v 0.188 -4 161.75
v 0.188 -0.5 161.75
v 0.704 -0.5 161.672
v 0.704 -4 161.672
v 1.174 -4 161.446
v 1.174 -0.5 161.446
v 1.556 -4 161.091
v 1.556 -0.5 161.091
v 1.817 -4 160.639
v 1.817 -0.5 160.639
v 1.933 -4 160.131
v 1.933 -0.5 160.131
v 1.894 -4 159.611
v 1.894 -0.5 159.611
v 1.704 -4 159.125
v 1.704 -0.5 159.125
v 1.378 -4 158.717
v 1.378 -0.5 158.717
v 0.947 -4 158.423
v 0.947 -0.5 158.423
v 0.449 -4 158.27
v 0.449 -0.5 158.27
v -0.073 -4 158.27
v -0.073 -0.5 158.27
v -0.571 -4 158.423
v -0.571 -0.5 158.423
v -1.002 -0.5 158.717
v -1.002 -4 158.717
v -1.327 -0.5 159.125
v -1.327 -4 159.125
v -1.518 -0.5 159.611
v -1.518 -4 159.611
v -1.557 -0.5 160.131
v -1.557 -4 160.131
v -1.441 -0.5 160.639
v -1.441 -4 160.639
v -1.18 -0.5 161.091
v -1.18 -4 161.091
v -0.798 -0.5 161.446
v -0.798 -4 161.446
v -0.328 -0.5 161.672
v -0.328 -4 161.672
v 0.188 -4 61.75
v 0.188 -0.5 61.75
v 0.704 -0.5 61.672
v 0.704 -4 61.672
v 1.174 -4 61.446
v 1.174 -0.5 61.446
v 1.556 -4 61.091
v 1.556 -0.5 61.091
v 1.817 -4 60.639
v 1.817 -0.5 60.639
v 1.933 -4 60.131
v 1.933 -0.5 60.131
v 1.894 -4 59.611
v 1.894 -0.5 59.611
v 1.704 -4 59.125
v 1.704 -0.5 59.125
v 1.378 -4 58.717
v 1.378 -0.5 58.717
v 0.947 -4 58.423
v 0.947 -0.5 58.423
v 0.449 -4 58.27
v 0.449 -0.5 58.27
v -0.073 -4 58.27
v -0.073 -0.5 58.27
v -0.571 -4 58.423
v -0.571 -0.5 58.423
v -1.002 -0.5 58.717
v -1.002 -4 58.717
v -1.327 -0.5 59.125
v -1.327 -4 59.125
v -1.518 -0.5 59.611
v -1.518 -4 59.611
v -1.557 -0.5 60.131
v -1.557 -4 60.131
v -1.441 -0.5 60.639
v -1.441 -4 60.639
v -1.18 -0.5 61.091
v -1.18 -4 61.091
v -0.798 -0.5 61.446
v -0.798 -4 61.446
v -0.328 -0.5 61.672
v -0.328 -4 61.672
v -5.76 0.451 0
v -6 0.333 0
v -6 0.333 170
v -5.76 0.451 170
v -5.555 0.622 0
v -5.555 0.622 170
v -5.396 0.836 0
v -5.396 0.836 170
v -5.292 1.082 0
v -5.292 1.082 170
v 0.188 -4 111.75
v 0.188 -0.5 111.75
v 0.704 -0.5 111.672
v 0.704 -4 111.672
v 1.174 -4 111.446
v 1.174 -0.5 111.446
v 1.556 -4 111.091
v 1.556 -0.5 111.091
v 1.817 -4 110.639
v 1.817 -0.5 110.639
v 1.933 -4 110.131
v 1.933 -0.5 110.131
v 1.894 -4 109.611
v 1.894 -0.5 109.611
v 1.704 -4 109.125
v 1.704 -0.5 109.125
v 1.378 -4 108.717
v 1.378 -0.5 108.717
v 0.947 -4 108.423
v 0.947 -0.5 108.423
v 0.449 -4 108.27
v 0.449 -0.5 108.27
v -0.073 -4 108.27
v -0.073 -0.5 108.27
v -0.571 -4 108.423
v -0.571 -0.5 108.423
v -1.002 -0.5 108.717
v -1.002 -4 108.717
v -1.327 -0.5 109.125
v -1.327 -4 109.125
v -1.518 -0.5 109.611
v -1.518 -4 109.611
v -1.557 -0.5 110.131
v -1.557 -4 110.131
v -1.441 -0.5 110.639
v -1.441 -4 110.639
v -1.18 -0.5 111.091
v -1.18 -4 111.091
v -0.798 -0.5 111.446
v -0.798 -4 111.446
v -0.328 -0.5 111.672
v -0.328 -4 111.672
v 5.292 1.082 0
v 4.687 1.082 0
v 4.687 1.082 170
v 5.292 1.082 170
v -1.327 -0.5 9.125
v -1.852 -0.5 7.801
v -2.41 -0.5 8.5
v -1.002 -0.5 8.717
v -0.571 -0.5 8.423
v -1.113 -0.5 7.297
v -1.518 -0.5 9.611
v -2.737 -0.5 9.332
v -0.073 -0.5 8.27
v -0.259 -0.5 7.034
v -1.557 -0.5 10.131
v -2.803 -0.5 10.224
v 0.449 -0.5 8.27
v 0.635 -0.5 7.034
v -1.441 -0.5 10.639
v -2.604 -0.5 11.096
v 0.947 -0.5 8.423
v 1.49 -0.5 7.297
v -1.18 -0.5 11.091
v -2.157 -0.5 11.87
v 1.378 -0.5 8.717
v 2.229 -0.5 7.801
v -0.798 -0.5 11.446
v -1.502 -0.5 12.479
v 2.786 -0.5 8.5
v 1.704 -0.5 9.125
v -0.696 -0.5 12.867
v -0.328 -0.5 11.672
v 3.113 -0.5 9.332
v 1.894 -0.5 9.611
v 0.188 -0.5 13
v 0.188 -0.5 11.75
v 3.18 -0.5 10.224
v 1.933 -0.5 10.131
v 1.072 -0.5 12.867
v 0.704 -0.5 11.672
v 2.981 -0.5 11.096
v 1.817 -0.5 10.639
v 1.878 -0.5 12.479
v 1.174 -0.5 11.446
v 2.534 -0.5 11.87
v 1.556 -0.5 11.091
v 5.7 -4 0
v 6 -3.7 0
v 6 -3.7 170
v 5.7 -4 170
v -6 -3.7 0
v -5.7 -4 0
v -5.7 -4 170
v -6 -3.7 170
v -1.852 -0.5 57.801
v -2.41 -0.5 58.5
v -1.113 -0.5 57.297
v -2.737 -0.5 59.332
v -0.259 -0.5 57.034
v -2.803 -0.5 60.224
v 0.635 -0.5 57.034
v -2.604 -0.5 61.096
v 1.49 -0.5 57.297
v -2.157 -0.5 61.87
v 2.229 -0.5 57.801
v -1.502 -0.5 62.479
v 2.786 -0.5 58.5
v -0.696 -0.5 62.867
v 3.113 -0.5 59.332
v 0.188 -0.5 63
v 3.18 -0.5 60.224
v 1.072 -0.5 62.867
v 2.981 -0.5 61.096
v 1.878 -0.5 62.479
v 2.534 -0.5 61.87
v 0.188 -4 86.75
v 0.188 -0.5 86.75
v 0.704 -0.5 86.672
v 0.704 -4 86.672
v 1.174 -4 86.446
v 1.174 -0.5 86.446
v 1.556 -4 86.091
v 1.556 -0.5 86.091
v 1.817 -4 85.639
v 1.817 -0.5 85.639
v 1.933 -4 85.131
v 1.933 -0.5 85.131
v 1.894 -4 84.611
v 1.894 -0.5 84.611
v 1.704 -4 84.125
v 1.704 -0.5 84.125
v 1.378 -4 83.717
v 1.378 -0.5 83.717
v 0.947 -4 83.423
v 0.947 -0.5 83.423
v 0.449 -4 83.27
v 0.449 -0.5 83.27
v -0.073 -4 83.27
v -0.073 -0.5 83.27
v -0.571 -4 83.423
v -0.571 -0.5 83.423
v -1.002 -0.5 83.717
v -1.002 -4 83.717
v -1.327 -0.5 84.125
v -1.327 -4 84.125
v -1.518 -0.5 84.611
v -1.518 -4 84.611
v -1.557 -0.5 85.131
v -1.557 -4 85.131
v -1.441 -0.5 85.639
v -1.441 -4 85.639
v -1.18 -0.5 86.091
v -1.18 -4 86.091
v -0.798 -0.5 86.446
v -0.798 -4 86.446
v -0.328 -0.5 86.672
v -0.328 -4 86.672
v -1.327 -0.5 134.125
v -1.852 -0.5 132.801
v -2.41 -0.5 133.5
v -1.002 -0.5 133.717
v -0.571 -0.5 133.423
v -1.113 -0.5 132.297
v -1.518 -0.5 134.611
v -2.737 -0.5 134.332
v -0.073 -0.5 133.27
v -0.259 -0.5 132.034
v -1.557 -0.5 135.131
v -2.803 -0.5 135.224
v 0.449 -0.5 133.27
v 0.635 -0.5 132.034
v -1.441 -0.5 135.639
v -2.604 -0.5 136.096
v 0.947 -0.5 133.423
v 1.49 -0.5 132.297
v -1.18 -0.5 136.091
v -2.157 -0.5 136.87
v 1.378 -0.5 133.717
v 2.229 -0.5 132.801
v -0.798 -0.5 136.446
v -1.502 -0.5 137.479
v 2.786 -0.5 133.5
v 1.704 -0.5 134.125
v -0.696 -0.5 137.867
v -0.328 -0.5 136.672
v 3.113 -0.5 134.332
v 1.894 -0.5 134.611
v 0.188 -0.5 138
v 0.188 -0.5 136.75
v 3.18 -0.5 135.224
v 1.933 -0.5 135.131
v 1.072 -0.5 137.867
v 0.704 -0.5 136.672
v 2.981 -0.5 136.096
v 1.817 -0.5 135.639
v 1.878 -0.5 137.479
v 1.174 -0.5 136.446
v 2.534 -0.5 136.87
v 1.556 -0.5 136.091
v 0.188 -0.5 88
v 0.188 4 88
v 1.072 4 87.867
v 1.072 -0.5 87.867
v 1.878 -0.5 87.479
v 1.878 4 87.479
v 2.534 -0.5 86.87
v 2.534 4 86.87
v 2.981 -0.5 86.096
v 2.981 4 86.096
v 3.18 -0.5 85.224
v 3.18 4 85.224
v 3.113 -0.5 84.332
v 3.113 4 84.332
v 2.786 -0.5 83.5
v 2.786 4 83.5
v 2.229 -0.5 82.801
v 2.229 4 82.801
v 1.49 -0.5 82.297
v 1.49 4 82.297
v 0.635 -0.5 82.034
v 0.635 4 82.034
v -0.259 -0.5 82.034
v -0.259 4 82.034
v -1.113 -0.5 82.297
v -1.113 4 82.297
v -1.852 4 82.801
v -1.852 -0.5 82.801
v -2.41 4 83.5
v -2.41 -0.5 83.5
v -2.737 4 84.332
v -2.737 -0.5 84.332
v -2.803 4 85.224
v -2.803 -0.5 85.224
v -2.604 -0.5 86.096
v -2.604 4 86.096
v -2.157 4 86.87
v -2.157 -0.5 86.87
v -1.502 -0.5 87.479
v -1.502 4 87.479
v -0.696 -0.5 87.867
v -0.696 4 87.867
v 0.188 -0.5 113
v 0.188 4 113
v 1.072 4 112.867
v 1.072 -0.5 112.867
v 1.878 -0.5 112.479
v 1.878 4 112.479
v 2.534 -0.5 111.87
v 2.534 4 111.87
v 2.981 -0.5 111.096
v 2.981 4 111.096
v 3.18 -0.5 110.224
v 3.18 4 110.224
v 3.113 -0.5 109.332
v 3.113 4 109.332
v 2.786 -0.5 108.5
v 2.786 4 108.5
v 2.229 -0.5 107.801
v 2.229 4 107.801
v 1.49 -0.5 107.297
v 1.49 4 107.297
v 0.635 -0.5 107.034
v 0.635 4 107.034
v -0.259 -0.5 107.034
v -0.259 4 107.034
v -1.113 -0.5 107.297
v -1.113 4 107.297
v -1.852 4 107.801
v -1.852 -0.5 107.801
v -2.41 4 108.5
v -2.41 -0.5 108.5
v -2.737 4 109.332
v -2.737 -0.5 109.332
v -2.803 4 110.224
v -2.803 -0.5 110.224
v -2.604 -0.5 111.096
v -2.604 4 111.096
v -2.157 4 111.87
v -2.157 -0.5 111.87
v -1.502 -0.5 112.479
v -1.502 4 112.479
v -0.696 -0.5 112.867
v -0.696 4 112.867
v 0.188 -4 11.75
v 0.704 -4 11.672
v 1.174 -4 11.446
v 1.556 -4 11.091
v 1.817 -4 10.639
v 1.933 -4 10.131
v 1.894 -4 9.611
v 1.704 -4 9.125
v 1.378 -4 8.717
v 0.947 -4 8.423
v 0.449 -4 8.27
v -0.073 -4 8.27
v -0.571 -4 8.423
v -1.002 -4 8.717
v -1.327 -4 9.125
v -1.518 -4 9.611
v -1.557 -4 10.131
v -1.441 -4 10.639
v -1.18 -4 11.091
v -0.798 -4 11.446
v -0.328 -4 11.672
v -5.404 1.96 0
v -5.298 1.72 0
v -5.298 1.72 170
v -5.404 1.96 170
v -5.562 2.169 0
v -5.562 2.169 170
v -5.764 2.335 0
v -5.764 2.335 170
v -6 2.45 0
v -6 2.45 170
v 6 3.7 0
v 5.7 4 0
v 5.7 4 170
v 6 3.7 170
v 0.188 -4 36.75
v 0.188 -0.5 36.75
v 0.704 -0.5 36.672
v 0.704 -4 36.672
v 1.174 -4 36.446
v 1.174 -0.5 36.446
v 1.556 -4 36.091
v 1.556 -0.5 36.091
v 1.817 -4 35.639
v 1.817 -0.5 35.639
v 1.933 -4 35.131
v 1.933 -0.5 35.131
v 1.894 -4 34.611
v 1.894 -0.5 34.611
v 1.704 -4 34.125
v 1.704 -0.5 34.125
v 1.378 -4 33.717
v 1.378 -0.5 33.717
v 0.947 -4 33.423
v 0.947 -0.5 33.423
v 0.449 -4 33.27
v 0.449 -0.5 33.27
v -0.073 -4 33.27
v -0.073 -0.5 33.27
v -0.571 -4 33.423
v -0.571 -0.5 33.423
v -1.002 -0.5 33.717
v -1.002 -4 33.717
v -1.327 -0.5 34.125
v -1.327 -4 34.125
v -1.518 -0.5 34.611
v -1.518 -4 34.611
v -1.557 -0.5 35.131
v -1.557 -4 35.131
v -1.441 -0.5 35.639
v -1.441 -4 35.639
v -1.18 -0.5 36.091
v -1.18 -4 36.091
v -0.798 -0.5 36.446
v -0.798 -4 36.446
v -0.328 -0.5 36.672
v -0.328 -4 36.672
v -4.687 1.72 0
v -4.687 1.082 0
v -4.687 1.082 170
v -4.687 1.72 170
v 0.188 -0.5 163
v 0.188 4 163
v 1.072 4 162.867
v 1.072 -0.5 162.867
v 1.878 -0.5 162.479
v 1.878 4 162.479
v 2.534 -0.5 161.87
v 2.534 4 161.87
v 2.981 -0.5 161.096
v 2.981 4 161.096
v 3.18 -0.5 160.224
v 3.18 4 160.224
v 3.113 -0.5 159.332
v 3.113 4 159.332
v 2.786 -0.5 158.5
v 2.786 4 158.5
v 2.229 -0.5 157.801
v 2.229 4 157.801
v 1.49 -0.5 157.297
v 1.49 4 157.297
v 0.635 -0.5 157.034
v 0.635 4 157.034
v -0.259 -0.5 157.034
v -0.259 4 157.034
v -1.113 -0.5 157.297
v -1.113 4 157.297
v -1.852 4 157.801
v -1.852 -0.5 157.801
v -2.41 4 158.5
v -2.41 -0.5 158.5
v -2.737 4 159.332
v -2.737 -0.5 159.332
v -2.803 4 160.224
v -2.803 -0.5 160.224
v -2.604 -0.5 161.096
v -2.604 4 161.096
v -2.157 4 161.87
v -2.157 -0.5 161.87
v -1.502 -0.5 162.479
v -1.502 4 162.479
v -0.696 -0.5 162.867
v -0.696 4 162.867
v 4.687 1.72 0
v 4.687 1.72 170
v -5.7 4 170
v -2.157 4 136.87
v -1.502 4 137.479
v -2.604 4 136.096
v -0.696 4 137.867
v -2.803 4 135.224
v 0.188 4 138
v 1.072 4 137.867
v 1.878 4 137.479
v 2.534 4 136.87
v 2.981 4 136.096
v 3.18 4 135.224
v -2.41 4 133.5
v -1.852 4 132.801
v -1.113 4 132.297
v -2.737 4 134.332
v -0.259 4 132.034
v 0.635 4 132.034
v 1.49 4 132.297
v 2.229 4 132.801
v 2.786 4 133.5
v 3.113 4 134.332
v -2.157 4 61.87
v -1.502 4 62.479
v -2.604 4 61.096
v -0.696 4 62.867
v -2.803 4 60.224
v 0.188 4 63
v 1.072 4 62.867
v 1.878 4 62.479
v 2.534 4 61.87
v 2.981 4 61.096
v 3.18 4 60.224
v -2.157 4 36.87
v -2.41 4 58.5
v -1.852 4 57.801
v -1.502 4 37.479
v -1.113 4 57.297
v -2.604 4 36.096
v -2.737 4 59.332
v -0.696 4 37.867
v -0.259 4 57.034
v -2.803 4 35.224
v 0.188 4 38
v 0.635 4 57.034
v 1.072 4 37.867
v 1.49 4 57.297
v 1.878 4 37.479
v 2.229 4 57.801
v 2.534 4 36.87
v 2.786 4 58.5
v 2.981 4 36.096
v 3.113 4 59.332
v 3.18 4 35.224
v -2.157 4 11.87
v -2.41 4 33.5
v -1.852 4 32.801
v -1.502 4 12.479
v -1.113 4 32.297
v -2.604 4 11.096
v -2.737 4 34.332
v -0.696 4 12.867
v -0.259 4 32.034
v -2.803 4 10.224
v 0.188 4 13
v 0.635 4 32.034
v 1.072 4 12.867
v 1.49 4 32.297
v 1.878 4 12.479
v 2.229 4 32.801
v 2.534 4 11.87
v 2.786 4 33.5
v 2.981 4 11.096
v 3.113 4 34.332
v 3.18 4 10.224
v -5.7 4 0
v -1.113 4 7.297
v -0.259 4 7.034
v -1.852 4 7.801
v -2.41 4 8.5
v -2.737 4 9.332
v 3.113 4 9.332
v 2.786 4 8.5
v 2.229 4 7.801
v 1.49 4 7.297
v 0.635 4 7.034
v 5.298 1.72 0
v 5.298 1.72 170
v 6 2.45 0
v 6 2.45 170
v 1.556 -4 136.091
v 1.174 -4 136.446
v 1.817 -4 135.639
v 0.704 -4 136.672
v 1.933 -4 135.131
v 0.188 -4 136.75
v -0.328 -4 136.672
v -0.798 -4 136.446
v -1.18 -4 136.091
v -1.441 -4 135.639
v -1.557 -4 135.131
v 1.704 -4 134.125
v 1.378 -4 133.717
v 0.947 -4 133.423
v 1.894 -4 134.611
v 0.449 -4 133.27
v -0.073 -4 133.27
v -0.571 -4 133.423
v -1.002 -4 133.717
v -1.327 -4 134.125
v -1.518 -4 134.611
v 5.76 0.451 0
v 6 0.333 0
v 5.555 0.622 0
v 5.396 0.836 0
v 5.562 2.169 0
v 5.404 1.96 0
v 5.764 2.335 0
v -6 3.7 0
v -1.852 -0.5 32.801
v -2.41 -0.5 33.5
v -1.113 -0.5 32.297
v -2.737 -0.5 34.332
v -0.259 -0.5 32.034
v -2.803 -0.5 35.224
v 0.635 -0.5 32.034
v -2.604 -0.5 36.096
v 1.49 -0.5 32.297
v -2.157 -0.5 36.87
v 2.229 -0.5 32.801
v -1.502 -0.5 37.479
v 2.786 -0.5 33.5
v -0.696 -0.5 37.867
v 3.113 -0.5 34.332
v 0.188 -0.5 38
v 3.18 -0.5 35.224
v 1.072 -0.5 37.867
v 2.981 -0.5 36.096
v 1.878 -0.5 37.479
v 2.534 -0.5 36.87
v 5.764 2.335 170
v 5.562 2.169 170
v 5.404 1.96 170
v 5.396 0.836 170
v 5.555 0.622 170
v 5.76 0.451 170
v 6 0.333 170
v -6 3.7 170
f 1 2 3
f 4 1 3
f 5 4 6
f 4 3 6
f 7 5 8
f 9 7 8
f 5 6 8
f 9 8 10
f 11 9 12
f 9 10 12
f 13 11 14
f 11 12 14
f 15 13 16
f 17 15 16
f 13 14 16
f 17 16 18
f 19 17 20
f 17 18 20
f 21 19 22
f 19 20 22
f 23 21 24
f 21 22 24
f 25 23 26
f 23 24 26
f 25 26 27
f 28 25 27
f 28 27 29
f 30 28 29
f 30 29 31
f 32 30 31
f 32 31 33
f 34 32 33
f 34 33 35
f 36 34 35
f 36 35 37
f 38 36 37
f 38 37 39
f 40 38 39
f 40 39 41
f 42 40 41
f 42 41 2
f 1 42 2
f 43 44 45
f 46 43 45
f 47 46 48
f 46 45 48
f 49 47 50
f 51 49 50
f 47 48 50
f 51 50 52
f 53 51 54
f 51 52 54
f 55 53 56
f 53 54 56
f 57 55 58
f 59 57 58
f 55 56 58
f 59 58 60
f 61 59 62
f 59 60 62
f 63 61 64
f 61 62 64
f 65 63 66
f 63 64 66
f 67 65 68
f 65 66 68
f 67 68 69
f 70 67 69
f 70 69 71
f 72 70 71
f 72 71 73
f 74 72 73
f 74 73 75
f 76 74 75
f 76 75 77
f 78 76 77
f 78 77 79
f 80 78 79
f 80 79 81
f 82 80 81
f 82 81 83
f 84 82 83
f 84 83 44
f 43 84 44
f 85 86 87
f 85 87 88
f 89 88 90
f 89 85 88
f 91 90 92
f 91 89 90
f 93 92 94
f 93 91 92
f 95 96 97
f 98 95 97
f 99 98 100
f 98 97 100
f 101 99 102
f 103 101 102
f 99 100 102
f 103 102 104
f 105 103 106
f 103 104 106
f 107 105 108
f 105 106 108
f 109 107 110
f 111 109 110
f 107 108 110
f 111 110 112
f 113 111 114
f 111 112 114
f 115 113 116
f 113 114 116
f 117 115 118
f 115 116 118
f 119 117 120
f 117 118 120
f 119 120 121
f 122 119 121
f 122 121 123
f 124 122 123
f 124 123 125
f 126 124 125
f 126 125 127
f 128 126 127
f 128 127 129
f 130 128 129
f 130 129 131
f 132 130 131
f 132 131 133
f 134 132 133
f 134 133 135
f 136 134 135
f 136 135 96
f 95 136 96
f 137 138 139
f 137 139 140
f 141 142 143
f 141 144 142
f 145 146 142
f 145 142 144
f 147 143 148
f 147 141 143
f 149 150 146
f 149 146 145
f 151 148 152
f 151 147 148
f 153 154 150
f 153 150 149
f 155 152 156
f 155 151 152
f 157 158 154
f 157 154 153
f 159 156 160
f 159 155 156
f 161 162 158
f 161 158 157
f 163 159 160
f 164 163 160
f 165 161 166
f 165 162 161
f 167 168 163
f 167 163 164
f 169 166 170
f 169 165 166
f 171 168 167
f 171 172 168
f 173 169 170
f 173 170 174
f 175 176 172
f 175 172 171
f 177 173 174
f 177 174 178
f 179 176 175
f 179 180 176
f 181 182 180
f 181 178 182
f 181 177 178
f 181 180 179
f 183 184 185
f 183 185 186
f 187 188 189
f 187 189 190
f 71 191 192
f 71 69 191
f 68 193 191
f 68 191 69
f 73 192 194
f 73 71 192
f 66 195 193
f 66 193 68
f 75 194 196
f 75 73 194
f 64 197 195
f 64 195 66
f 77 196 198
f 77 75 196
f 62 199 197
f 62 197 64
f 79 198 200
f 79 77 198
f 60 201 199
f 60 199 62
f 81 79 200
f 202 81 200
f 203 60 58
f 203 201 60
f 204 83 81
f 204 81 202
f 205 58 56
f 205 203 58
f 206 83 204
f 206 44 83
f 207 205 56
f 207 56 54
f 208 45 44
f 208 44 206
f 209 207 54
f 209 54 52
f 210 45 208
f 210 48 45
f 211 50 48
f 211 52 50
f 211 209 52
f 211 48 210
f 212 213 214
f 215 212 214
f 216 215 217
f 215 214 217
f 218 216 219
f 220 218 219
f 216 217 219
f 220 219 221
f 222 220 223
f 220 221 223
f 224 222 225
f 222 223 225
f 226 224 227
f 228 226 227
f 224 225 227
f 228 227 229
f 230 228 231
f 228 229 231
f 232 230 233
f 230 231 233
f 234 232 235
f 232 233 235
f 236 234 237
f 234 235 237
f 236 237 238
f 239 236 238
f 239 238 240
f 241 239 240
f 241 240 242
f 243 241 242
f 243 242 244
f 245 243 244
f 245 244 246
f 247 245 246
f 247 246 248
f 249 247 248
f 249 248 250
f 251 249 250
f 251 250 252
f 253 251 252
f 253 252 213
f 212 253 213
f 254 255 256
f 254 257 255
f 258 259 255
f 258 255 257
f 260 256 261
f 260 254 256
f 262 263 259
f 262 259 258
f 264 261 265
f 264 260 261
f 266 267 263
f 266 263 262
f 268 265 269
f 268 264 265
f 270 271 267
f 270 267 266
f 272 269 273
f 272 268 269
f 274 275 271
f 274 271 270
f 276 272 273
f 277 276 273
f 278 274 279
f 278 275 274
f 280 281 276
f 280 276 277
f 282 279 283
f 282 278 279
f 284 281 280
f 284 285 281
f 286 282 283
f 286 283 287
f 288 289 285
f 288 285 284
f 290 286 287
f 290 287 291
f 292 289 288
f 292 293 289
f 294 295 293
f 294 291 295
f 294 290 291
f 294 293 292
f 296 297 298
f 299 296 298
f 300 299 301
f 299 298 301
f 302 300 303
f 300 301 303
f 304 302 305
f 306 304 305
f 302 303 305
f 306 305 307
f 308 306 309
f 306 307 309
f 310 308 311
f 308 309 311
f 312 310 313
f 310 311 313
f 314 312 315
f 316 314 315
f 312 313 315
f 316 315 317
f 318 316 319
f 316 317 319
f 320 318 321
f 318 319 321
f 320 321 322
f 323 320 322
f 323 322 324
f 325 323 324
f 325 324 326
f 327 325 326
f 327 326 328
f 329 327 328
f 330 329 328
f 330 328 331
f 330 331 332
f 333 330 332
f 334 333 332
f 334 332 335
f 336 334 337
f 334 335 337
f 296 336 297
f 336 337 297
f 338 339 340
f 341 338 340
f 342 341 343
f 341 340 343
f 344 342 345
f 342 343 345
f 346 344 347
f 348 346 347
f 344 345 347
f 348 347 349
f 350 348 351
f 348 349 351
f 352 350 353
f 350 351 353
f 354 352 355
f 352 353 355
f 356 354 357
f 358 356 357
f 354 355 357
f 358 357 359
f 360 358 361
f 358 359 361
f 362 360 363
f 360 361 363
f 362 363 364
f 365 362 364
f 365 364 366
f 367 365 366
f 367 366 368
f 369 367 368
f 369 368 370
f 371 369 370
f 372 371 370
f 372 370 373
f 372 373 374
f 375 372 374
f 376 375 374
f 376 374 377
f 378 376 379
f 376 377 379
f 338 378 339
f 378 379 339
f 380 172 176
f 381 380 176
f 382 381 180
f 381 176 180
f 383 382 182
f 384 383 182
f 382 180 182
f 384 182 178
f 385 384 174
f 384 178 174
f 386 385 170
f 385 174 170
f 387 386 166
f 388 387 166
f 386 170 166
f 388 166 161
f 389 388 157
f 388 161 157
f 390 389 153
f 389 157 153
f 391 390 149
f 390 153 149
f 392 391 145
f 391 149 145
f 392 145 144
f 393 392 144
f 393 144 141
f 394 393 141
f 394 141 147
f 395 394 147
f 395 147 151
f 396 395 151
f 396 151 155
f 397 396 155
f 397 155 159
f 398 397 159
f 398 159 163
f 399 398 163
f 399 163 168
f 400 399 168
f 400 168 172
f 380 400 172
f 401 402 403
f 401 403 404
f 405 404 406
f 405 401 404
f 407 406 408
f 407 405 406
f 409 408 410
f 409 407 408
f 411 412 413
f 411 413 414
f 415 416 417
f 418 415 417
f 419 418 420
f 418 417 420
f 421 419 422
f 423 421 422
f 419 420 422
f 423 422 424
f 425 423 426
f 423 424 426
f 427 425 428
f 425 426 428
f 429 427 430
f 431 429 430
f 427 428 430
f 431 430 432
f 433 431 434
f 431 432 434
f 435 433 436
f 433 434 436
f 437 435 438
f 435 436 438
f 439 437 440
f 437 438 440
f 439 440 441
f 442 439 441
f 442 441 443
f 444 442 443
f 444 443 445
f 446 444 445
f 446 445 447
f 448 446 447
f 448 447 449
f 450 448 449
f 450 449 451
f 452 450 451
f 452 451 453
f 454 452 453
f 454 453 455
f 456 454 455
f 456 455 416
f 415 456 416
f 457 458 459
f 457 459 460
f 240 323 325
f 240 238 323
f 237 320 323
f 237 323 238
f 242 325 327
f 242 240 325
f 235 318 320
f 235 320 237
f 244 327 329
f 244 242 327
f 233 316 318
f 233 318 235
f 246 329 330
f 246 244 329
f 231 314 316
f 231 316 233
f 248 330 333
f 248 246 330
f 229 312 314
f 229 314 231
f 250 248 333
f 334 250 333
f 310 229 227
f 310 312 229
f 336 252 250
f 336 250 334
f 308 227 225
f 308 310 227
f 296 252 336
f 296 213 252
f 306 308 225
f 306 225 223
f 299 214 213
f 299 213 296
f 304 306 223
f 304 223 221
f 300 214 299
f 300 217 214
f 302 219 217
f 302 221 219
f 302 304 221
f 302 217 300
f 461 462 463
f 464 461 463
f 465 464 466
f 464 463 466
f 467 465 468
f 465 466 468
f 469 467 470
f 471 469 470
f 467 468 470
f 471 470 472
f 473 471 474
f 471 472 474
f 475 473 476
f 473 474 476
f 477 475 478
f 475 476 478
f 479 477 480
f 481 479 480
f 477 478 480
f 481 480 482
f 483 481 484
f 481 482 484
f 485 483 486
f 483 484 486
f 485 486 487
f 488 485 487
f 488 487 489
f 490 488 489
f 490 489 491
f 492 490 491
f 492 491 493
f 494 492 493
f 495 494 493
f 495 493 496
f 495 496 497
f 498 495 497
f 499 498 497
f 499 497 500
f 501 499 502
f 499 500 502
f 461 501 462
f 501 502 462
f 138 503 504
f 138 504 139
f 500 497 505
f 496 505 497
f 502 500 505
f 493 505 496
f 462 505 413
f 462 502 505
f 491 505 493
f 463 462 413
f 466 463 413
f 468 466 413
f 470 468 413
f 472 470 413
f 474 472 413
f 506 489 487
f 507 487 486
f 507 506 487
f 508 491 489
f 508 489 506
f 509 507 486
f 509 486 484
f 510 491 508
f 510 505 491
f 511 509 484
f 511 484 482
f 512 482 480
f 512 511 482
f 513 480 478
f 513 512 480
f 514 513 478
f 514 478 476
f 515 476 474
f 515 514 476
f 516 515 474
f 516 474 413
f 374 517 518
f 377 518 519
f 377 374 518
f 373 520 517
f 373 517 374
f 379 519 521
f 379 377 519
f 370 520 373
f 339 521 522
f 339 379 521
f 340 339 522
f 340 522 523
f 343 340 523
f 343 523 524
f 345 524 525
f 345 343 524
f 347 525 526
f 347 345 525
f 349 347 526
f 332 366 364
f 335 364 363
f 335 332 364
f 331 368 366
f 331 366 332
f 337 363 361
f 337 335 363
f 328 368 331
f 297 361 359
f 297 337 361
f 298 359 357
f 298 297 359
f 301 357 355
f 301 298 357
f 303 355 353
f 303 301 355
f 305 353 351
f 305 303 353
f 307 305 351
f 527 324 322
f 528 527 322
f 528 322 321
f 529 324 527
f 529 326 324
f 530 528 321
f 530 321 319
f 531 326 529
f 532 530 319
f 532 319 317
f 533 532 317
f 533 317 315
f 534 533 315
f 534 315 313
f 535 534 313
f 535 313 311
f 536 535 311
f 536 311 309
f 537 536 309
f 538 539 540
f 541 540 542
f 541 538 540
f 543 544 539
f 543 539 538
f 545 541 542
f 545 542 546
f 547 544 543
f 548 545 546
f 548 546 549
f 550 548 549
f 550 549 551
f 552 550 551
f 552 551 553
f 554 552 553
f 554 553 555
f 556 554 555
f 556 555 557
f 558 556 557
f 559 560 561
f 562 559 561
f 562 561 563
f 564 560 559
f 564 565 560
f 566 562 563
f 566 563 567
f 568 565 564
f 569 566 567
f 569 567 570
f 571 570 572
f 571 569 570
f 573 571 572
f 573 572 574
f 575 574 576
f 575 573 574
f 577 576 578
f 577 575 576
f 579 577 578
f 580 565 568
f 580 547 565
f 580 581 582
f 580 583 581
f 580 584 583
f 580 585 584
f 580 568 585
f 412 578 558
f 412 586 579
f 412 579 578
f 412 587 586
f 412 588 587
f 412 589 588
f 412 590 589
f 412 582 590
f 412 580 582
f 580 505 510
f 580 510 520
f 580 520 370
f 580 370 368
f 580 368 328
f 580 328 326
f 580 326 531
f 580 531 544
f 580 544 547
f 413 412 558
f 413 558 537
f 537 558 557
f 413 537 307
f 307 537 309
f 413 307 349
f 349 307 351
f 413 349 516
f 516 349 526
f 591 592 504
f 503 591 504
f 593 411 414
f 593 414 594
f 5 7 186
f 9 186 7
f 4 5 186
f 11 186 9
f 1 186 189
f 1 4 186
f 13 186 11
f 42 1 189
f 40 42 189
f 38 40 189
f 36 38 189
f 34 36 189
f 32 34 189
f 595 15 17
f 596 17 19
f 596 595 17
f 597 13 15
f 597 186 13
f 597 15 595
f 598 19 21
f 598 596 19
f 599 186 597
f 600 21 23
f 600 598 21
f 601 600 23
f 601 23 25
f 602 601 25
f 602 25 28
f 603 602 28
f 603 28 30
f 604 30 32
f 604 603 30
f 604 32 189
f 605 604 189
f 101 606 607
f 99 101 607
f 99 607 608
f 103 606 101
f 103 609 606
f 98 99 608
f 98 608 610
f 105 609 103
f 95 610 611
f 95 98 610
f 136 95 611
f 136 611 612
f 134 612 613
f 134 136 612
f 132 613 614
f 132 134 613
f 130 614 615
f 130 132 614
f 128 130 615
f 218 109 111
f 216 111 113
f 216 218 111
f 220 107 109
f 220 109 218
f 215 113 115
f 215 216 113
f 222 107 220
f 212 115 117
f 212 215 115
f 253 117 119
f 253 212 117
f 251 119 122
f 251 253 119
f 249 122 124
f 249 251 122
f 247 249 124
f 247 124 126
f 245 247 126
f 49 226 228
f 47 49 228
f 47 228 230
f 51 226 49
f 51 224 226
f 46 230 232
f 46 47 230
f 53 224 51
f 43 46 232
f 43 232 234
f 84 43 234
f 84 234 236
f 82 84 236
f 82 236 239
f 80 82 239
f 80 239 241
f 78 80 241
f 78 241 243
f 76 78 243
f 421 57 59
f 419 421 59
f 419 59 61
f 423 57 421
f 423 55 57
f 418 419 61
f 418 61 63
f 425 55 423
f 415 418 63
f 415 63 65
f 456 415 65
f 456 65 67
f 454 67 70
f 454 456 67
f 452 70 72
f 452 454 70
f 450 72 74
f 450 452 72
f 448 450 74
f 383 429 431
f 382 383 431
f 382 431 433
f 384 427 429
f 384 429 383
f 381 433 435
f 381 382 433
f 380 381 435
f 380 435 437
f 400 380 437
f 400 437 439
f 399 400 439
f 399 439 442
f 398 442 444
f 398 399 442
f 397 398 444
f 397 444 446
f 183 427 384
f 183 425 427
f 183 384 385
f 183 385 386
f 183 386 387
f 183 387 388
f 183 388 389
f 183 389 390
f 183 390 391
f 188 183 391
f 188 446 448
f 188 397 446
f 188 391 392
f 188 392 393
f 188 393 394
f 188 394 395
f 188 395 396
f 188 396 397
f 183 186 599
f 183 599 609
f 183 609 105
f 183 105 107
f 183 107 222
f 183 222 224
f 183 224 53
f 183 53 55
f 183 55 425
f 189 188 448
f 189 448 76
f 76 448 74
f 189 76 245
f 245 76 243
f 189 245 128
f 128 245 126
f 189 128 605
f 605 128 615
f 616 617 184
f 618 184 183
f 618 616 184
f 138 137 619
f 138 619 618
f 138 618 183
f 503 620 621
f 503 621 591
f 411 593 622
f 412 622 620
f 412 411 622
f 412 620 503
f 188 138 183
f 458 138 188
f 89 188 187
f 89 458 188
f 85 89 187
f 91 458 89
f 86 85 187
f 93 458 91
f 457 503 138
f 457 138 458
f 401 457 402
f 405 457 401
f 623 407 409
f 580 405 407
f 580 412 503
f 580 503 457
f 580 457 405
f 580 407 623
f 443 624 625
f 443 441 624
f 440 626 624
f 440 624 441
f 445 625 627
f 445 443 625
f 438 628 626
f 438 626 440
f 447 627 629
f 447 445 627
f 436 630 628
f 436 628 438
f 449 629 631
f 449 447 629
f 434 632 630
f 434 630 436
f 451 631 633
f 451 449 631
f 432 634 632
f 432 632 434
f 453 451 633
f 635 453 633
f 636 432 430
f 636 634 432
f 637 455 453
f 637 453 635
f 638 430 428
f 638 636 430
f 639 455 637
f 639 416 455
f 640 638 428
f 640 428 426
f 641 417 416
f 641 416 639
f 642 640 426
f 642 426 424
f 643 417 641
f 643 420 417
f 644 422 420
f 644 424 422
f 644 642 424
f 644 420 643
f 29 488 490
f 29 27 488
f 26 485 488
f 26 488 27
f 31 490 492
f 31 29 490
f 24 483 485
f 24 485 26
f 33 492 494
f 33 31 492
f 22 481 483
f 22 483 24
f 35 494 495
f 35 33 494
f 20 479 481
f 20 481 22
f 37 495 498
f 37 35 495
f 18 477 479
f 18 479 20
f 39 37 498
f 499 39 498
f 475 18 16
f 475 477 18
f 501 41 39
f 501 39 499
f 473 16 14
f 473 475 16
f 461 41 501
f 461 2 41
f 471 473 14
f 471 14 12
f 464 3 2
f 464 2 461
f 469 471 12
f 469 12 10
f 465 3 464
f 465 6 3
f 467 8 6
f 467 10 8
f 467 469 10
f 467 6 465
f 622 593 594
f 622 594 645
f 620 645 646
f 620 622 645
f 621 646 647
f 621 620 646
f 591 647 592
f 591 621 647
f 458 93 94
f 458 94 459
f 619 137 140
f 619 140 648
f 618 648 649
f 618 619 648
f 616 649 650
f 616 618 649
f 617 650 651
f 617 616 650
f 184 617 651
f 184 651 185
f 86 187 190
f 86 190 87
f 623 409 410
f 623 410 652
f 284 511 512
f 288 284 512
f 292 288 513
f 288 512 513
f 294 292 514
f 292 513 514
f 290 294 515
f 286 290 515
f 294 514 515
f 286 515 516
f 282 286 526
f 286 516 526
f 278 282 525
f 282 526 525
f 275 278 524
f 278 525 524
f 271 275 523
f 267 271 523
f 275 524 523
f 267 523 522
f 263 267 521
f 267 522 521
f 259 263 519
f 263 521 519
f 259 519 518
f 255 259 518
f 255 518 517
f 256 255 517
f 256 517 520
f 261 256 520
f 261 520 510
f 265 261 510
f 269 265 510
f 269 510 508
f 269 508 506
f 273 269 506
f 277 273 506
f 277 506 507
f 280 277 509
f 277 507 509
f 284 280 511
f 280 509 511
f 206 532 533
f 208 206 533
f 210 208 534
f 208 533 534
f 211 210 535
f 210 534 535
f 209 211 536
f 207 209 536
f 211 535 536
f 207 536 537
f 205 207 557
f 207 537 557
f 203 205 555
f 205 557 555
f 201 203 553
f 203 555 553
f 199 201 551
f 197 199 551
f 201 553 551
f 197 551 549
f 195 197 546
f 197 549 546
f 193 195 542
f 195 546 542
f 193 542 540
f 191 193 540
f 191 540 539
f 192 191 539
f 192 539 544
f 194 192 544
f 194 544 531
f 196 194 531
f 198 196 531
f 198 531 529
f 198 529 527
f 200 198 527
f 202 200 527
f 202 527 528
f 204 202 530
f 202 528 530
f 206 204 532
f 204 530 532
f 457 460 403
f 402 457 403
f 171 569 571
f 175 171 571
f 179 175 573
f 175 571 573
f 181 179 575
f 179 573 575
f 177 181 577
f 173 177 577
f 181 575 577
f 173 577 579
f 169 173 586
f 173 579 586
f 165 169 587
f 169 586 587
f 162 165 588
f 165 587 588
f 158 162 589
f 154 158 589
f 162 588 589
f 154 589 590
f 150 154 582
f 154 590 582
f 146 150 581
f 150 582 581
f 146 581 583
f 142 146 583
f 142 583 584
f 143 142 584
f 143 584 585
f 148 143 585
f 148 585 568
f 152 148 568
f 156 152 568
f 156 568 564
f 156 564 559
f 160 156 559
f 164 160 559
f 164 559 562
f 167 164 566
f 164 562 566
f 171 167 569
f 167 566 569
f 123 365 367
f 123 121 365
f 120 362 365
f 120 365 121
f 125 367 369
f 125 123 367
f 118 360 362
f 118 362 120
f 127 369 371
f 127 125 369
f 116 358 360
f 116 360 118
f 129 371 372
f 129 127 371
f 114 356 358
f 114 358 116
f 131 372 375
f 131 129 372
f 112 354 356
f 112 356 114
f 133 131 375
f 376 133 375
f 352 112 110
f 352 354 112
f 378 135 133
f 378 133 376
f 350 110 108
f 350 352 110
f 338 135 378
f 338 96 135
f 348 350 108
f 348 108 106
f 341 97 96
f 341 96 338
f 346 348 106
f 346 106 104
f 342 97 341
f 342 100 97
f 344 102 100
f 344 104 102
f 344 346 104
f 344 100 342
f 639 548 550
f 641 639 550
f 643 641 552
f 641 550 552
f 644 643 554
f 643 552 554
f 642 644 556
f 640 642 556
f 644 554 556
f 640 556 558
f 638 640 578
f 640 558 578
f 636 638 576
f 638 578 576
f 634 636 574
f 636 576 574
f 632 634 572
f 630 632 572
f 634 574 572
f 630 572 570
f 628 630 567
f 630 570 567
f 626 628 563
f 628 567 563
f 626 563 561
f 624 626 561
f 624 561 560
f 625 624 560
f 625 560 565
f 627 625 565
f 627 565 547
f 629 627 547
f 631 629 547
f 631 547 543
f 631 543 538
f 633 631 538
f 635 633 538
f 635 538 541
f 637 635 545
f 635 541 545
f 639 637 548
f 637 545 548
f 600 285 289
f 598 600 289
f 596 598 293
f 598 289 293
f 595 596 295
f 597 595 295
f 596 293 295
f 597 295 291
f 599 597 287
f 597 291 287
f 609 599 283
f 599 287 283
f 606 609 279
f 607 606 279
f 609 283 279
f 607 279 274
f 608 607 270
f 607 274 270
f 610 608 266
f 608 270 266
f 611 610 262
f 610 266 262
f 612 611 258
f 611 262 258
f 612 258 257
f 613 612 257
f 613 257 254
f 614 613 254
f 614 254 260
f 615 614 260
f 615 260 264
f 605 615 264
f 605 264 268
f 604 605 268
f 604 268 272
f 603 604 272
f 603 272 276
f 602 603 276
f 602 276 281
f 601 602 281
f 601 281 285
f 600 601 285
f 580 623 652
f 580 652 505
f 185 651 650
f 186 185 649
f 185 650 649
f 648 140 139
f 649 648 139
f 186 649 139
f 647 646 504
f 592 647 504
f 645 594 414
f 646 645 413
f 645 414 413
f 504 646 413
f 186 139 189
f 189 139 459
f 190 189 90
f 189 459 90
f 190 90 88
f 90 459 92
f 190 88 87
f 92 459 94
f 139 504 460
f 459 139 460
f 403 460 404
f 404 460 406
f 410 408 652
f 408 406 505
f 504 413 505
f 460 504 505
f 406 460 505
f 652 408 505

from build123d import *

# Parameters (mm, degrees)
EXTRUDE_1_DEPTH        = 170
SKETCH_2_R             = 3
SKETCH_2_R_2           = 1.75
CUT_EXTRUDE_1_DEPTH    = 4.5
SKETCH_2_2_R           = 1.75
CUT_EXTRUDE_2_DEPTH    = 171.293863659
PATTERN_LINEAR_1_COUNT = 12
PATTERN_LINEAR_1_PITCH = 25


with BuildPart() as part:
    # Эскиз1 → Бобышка-Вытянуть1 (new body)
    with BuildSketch(Plane.XY):
        with BuildLine():
            Line((-6, 3.7), (-5.7, 4))
            Line((-5.7, 4), (5.7, 4))
            Line((5.7, 4), (6, 3.7))
            Line((6, 3.7), (6, 2.449776022))
            ThreePointArc((6, 2.449776022), (5.561887715, 2.168810579), (5.297911886, 1.720256551))
            Line((5.297911886, 1.720256551), (4.687472904, 1.720256551))
            Line((4.687472904, 1.720256551), (4.687472904, 1.082255421))
            Line((4.687472904, 1.082255421), (5.292171789, 1.082255421))
            ThreePointArc((5.292171789, 1.082255421), (5.554928022, 0.621665058), (6, 0.333402583))
            Line((6, 0.333402583), (6, -3.7))
            Line((6, -3.7), (5.7, -4))
            Line((5.7, -4), (-5.7, -4))
            Line((-5.7, -4), (-6, -3.7))
            Line((-6, -3.7), (-6, 0.333402583))
            ThreePointArc((-6, 0.333402583), (-5.554928022, 0.621665058), (-5.292171789, 1.082255421))
            Line((-5.292171789, 1.082255421), (-4.687472904, 1.082255421))
            Line((-4.687472904, 1.082255421), (-4.687472904, 1.720256551))
            Line((-4.687472904, 1.720256551), (-5.297911886, 1.720256551))
            ThreePointArc((-5.297911886, 1.720256551), (-5.561887715, 2.168810579), (-6, 2.449776022))
            Line((-6, 2.449776022), (-6, 3.7))
        make_face()
    extrude(amount=EXTRUDE_1_DEPTH)

    # Эскиз2 → Вырез-Вытянуть1 (cut)
    with BuildSketch(Plane(origin=(0, 4, 0), x_dir=(1, 0, 0), z_dir=(0, 1, 0))):
        with Locations((0.188190244, -10)):
            Circle(SKETCH_2_R)
        with Locations((0.188190244, -10)):
            Circle(SKETCH_2_R_2, mode=Mode.SUBTRACT)
    cut_extrude_1 = extrude(amount=-CUT_EXTRUDE_1_DEPTH, mode=Mode.SUBTRACT)

    # Эскиз2<2> → Вырез-Вытянуть2 (cut, through all)
    with BuildSketch(Plane(origin=(0, 4, 0), x_dir=(1, 0, 0), z_dir=(0, 1, 0))):
        with Locations((0.188190244, -10)):
            Circle(SKETCH_2_2_R)
    cut_extrude_2 = extrude(amount=-CUT_EXTRUDE_2_DEPTH, mode=Mode.SUBTRACT)

    # Линейный массив1: Вырез-Вытянуть1, Вырез-Вытянуть2 ×12
    with Locations(*[(0, 0, i * PATTERN_LINEAR_1_PITCH) for i in range(1, PATTERN_LINEAR_1_COUNT)]):
        add(cut_extrude_1, mode=Mode.SUBTRACT)
        add(cut_extrude_2, mode=Mode.SUBTRACT)


solid = part.part
